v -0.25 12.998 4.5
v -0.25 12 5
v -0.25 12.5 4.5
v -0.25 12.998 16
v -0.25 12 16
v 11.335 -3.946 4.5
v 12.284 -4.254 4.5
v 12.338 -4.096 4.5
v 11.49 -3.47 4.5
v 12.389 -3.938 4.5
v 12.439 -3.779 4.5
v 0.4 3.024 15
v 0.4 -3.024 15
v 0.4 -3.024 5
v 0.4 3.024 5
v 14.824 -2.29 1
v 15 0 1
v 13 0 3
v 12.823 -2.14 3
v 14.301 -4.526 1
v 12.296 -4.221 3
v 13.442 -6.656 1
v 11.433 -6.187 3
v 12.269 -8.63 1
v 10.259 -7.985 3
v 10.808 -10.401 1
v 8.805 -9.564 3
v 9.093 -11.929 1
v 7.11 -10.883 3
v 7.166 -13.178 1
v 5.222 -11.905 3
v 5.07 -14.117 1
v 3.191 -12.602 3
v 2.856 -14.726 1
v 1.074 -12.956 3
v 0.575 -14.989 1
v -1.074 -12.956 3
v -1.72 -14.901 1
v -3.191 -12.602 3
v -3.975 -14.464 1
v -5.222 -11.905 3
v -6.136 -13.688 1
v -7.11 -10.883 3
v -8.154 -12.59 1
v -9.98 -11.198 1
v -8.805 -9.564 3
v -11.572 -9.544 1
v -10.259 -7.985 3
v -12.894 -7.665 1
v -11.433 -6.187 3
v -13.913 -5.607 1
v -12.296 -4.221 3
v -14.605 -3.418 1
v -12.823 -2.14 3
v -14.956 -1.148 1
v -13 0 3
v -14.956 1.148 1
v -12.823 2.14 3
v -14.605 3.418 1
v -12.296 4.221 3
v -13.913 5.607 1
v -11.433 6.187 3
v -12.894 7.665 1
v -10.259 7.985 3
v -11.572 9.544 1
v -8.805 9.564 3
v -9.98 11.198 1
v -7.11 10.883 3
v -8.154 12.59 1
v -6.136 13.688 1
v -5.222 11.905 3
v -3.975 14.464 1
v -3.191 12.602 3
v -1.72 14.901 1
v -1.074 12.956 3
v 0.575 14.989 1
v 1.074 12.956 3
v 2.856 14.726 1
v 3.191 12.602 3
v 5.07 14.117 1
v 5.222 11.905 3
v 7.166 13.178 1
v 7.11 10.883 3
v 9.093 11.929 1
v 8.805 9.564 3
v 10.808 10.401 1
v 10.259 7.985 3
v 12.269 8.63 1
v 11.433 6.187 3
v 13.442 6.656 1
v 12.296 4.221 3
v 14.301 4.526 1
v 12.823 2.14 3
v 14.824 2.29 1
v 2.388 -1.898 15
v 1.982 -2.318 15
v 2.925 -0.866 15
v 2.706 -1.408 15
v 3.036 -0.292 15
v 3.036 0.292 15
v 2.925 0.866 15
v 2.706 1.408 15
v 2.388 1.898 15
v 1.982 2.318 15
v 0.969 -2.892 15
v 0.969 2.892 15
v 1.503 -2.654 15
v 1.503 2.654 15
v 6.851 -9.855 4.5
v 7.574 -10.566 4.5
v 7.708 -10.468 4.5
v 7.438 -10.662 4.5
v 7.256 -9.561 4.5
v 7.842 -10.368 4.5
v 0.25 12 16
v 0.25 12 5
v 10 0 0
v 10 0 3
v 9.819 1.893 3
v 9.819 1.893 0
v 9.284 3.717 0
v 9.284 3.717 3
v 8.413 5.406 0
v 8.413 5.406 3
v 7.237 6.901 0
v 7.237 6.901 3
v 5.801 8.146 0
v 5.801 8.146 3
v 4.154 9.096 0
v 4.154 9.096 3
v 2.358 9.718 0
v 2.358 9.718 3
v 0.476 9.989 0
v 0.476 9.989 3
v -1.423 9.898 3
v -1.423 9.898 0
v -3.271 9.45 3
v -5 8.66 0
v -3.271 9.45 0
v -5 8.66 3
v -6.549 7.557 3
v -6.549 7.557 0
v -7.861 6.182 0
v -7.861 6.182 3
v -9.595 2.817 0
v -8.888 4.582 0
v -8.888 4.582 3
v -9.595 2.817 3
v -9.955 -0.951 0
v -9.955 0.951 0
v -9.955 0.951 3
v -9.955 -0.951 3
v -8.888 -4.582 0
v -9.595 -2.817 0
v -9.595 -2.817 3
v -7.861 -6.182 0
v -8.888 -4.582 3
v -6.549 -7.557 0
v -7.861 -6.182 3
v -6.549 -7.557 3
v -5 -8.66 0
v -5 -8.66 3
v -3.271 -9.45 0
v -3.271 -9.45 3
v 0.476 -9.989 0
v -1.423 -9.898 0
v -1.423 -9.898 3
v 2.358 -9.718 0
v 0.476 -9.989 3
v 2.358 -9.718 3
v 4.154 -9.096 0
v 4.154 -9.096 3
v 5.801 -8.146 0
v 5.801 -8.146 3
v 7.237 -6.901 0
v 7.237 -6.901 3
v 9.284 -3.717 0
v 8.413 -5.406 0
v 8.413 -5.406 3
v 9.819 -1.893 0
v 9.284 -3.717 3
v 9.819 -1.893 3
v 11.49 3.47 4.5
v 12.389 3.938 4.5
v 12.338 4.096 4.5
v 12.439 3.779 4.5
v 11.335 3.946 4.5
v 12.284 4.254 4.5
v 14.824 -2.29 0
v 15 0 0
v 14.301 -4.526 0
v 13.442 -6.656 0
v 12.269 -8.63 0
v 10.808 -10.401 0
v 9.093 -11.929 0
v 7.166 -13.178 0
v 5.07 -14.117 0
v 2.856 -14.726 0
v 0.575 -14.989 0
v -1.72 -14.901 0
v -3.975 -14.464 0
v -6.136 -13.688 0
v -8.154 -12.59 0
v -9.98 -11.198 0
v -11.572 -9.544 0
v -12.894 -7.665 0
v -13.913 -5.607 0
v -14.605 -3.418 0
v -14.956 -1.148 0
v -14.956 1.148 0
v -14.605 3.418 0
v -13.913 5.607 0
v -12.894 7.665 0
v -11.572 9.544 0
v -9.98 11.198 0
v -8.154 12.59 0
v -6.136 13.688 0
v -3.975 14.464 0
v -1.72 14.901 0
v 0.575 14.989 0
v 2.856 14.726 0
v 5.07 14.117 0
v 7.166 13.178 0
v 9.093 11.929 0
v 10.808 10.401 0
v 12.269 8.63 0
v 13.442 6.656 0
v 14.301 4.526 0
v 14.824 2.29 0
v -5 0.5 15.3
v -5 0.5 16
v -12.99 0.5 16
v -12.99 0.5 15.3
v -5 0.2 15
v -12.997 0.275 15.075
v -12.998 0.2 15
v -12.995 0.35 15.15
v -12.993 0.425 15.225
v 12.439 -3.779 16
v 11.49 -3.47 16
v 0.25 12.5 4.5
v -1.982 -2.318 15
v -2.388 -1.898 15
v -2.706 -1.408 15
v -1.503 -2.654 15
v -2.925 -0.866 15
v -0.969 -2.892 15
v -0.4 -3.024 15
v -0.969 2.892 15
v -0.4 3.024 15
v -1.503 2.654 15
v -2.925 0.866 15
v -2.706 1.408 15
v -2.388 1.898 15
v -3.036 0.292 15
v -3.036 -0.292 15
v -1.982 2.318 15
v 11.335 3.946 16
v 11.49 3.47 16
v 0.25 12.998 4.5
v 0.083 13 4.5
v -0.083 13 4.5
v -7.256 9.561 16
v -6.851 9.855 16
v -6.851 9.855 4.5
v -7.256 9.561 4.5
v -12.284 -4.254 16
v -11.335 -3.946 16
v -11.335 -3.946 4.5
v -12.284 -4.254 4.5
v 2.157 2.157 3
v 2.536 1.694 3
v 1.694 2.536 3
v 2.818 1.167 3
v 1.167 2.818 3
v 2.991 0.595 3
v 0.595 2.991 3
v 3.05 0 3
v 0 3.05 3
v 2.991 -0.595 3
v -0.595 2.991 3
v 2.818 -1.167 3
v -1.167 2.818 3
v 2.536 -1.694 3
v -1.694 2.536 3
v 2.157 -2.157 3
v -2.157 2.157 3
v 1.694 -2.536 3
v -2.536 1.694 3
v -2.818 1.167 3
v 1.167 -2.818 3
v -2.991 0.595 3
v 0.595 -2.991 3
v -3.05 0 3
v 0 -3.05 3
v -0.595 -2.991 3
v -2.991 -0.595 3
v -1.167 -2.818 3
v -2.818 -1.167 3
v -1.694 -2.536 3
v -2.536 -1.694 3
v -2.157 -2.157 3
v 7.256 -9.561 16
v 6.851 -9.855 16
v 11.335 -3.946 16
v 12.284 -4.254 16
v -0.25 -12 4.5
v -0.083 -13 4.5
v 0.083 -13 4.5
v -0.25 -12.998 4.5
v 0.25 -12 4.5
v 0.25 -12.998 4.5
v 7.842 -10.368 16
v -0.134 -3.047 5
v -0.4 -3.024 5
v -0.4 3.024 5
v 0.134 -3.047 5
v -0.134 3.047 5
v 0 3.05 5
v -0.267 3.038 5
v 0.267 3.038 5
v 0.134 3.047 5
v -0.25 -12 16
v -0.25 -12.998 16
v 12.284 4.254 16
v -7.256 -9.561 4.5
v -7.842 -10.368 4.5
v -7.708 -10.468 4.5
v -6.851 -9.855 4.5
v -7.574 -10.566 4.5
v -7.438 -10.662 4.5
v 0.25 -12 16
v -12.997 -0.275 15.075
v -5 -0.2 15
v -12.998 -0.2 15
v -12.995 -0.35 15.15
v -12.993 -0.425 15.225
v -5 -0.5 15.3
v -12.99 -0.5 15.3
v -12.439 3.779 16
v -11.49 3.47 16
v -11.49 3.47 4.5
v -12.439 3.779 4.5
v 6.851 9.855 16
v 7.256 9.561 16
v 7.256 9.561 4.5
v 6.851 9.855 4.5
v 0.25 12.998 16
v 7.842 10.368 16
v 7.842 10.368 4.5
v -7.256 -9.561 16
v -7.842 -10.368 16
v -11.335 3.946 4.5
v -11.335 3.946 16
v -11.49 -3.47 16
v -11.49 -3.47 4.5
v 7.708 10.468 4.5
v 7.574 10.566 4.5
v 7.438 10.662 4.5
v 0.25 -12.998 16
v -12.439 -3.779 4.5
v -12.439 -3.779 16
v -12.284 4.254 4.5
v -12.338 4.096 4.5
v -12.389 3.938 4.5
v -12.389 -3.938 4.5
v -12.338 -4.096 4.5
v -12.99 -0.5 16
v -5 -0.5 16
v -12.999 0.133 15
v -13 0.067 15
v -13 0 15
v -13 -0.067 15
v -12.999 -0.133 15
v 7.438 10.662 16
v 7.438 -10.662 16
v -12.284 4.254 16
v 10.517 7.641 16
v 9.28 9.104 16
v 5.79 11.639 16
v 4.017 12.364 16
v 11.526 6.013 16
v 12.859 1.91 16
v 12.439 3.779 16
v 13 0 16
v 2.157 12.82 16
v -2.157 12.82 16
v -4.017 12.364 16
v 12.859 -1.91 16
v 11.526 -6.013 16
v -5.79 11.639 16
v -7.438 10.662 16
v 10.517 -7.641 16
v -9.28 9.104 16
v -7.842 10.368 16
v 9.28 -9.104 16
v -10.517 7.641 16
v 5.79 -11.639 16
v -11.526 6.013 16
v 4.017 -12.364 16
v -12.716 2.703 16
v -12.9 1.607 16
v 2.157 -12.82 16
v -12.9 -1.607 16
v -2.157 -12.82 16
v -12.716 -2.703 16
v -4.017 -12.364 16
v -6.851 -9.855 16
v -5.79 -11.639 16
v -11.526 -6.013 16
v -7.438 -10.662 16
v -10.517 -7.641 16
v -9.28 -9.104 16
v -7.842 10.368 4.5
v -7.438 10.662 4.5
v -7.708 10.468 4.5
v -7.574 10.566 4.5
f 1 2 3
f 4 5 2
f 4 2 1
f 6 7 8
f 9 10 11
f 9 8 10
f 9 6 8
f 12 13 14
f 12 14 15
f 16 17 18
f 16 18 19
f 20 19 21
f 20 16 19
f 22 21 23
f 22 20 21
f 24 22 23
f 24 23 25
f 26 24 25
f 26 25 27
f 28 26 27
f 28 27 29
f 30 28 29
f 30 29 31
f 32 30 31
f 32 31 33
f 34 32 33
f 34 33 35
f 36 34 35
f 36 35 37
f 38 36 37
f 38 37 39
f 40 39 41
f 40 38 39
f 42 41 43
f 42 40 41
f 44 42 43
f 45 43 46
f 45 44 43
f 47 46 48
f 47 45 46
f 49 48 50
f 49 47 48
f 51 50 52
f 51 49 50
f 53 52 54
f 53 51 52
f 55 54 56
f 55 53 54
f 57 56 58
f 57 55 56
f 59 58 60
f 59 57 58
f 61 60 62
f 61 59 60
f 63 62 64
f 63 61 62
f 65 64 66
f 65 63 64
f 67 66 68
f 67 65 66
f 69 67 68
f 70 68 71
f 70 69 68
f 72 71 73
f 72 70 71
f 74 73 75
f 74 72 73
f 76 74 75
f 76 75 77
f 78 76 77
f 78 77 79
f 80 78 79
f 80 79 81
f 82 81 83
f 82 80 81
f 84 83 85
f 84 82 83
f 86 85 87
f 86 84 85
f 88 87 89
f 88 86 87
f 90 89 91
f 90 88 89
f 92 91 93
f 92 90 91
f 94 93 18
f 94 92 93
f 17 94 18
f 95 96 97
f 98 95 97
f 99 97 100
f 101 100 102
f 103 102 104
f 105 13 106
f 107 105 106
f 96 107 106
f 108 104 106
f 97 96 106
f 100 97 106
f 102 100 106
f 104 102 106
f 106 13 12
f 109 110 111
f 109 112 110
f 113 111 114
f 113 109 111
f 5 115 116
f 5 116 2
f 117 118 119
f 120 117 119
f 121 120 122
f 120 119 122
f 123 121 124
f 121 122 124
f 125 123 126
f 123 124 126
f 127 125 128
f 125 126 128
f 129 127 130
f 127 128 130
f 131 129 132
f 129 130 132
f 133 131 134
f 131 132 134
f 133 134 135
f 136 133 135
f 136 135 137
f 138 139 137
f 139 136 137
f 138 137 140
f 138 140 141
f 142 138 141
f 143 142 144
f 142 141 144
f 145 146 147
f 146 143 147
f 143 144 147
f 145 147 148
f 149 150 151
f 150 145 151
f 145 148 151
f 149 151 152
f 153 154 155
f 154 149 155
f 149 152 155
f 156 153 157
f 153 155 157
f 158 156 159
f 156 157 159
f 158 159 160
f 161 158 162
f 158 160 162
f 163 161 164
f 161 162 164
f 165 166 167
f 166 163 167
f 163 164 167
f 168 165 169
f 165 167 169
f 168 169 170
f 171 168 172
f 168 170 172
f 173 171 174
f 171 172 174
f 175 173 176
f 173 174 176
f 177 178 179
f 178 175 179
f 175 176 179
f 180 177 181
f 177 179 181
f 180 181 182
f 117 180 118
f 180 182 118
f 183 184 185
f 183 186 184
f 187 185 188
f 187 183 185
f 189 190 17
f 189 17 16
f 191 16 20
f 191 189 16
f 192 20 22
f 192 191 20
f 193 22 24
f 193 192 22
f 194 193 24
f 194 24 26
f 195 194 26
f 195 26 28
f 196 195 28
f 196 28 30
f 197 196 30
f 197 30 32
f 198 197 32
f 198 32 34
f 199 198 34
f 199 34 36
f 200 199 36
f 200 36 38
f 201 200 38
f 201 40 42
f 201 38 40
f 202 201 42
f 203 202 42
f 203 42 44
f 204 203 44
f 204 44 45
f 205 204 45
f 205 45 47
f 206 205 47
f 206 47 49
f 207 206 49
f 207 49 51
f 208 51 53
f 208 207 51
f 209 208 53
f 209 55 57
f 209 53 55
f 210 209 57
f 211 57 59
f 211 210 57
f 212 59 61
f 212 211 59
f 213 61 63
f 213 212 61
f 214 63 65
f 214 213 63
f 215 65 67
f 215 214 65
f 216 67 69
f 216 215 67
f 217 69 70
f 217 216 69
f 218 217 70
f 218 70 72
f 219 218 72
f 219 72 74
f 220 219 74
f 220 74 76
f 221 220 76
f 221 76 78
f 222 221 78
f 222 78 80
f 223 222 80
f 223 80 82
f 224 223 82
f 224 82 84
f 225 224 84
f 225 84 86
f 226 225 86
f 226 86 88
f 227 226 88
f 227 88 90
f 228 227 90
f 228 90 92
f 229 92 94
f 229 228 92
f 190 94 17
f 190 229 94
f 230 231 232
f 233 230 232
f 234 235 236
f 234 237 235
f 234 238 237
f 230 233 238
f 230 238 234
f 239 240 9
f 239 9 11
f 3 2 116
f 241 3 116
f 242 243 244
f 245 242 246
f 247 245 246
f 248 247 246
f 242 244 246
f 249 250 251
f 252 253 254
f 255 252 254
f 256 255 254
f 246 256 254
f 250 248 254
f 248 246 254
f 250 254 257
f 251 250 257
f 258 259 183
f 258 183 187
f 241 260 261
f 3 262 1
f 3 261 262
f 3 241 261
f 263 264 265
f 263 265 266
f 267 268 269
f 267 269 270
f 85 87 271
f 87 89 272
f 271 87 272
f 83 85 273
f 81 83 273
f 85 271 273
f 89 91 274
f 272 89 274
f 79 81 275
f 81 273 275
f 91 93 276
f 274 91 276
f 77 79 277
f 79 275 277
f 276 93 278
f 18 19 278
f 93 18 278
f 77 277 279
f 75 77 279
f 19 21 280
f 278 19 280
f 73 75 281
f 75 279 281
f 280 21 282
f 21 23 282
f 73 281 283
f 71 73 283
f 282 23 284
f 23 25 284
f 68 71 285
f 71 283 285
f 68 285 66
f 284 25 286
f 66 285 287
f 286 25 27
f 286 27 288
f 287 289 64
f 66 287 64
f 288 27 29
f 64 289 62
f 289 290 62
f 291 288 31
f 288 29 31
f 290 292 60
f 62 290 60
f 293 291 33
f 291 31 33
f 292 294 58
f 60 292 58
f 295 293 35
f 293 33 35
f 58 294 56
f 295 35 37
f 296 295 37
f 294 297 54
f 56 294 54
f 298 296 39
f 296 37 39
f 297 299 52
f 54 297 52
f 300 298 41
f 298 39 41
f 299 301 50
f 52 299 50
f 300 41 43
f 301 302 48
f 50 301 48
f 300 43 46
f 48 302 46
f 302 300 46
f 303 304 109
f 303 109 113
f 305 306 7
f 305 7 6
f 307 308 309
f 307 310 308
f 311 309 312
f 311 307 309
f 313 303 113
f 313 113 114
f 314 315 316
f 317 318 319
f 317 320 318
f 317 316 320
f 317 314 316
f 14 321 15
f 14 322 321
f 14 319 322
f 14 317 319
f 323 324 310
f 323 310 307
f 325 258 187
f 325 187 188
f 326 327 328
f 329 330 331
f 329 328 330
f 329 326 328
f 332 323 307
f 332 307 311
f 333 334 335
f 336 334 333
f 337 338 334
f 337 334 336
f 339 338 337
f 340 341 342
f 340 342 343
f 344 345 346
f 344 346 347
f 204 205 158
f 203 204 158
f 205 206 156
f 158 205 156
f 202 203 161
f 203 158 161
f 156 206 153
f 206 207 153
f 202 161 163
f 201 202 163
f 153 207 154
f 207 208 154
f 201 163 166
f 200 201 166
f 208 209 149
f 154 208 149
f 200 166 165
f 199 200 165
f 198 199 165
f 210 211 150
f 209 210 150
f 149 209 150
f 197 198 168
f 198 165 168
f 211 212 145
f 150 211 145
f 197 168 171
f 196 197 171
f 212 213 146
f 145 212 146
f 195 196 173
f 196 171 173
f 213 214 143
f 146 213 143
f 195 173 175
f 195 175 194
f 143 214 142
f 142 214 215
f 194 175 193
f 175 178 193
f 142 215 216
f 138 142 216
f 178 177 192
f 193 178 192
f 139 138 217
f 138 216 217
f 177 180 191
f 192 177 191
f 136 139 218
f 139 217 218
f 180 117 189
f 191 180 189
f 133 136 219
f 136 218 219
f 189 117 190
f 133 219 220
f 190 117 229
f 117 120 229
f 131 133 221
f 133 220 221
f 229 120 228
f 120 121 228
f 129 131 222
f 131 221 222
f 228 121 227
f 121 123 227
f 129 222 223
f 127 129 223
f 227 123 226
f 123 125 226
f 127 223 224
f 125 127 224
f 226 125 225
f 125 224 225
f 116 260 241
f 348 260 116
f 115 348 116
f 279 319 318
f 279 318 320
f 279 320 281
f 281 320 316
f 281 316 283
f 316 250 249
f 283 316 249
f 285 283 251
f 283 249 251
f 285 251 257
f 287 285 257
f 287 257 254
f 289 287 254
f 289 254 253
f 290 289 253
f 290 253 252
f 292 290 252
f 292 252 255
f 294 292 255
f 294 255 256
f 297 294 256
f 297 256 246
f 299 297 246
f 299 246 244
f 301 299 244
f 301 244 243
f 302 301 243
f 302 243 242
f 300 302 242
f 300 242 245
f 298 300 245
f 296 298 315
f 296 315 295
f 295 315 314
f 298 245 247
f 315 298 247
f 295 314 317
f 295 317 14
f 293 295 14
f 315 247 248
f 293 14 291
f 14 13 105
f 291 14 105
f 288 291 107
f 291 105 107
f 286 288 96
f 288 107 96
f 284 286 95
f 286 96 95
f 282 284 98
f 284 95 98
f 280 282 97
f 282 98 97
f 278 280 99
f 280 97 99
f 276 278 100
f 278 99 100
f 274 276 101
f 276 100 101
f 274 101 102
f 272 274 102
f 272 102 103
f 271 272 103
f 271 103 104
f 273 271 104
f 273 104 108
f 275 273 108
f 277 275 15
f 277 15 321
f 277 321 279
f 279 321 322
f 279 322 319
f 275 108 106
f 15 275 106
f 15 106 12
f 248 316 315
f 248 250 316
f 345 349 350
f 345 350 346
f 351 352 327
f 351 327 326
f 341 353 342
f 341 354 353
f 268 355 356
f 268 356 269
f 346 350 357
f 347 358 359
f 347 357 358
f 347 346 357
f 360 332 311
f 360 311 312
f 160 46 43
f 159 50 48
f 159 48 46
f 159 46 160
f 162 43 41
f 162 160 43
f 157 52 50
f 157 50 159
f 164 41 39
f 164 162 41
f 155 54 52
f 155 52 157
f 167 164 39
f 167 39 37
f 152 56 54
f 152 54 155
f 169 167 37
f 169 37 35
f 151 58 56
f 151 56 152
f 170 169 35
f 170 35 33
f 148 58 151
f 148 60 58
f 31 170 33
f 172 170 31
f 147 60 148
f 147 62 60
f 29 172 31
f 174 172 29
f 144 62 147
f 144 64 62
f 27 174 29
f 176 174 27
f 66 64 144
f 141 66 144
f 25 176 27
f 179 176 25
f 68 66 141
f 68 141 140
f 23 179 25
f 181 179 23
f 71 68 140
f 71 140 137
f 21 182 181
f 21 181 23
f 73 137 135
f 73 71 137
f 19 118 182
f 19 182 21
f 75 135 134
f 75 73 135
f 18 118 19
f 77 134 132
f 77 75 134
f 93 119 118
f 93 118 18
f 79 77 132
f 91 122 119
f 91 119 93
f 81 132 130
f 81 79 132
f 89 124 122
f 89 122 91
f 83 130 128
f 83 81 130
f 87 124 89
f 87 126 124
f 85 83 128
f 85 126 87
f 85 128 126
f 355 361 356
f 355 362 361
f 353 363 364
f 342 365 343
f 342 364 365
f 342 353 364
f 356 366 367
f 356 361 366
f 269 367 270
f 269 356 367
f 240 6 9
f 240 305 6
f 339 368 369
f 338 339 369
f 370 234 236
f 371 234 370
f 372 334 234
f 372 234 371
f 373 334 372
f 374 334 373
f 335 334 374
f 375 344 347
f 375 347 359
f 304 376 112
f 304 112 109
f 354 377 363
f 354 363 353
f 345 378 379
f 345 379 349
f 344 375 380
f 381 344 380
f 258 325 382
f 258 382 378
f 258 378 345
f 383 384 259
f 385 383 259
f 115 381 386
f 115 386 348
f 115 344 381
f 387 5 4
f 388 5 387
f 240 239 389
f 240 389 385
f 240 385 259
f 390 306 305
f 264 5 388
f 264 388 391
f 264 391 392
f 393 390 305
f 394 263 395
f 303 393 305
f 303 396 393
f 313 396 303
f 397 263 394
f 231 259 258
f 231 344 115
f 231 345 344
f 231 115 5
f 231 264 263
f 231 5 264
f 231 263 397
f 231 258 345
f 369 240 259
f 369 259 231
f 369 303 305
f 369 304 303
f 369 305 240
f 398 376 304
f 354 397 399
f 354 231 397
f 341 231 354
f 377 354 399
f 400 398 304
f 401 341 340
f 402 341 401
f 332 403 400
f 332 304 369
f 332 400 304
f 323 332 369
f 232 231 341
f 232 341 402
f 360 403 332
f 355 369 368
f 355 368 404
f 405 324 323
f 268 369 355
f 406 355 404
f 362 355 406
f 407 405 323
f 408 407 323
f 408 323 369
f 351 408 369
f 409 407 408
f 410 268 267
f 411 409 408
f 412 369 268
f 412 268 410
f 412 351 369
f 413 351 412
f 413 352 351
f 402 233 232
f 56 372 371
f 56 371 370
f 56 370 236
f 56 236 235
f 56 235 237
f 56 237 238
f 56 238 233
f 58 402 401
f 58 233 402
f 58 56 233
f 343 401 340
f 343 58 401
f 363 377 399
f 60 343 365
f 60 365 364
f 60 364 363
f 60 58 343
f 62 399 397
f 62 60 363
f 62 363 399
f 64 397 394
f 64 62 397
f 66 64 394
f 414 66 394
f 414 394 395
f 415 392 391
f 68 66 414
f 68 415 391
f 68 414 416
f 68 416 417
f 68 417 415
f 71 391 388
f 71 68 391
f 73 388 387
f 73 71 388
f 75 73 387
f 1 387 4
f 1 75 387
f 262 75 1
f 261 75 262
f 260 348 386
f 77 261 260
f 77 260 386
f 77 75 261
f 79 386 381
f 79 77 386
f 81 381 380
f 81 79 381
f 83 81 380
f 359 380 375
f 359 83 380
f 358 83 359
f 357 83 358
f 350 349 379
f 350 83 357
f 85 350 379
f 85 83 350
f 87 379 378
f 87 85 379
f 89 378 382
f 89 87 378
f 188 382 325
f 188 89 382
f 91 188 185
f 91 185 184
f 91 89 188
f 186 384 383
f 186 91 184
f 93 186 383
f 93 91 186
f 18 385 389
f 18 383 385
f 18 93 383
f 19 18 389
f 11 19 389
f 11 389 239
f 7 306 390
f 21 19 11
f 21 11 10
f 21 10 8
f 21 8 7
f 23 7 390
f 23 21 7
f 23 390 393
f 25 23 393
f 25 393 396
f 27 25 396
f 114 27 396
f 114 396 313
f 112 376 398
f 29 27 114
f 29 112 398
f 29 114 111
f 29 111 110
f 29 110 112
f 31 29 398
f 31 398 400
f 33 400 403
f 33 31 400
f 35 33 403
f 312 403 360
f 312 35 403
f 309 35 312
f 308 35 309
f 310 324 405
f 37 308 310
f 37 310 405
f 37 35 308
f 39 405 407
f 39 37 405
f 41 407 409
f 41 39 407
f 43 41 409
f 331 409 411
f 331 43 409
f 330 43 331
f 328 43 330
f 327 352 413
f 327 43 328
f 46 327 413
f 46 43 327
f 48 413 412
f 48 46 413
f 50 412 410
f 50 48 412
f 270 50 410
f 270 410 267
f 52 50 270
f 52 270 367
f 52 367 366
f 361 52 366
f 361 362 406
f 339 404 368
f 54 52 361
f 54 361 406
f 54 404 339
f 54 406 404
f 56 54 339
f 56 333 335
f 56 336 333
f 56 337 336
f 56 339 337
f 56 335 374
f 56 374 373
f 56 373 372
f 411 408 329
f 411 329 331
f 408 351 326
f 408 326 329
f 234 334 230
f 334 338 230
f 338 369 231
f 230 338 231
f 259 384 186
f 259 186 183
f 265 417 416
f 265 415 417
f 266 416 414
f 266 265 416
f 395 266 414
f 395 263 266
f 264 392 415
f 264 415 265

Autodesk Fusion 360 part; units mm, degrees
sketch "Sketch1" plane through (0, 0, 0) normal (0, 0, 1) x (1, 0, 0) in component "Knob"
  circle A0 centre (0, 0) radius 15
  dimension "d1" = 30
extrude "Extrude1" add sketch "Sketch1" along normal blind 3 makes body 1 in component "Knob"
sketch "Sketch2" plane through (0, 0, 3) normal (0, 0, 1) x (-1, 0, 0) in component "Knob"
  circle A0 centre (0, 0) radius 15
  circle A1 centre (0, 0) radius 13
  dimension "d7" = 26
extrude "Extrude2" add sketch "Sketch2" along normal blind 13 separate body contours A1 makes body 2 in component "Knob"
hole "Hole2" at (0, 0, 3) direction (0, 0, 1) diameter 6.1 depth 12 tip angle 180 bodies 2 in component "Knob"
sketch "Sketch5" plane through (0, 0, 0) normal (0, 1, 0) x (1, 0, 0) in component "Knob"
  line L0 (0, -3) -> (0, 0)
  line L1 (0, 0) -> (10, 0)
  line L2 (10, 0) -> (10, -3)
  line L3 (10, -3) -> (0, -3)
  dimension "d26" = 10
  dimension "d27" = 3
revolve "Revolve1" cut sketch "Sketch5" angle 360 about axis through (0, 0, 3) along (0, 0, -1) bodies 1 in component "Knob"
sketch "Sketch6" plane through (0, 0, 16) normal (0, 0, 1) x (-1, 0, 0) in component "Knob"
  line L0 (5, -0.5) -> (15, -0.5)
  line L1 (15, -0.5) -> (15, 0.5)
  line L2 (15, 0.5) -> (5, 0.5)
  line L3 (5, 0.5) -> (5, -0.5)
  circle A0 centre (0, 0) radius 13
  dimension "d29" = 5
  dimension "d30" = 10
  dimension "d31" = 1
  dimension "d32" = 0.5
extrude "Extrude3" cut sketch "Sketch6" against normal blind 1 contours L0 L2 L3 A0 | L0 L1 L2 A0 picked at (7.6667, 0) bodies 2 in component "Knob"
chamfer "Chamfer2" distance 0.3 angle 45 2 edges at (-8.9952, 0.5, 15) (-8.9952, -0.5, 15) on bodies 2 in component "Knob"
sketch "Sketch1 (2)" plane through (0, 0, 16) normal (0, 0, 1) x (-1, 0, 0)
  line L0 (5, -0.5) -> (5, 0.5)
  line L1 (0.25, -13.5) -> (-0.25, -13.5)
  line L2 (-0.25, -13.5) -> (-0.25, -12)
  line L3 (-0.25, -12) -> (0.25, -12)
  line L4 (0.25, -12) -> (0.25, -13.5)
  arc A0 (12.9904, 0.5) -> (12.9904, -0.5) centre (0, 0) ccw
  line L5 (12.9904, -0.5) -> (5, -0.5)
  line L6 (5, 0.5) -> (12.9904, 0.5)
  dimension "d36" = 0.5
  dimension "d37" = 1.5
  dimension "d38" = 0.25
  dimension "d39" = 13.5
extrude "Extrude4" cut sketch "Sketch1 (2)" against normal blind 11.5 contours L2 L3 L4 A0 | L1 L2 L4 A0 bodies 2 in component "Knob"
chamfer "Chamfer4" distance 2 angle 45 1 edges at (-13.9849, -5.4242, 3) on bodies 1 in component "Knob"
chamfer "Chamfer6" distance 0.5 angle 45 1 edges at (0, 12, 4.5) on bodies 2 in component "Knob"
pattern_circular "C-Pattern3" count 10 over 360 about axis through (0, 0, 16) along (0, 0, 1) of "Extrude4" in component "Knob"
sketch "Sketch2 (2)" plane through (0, 0, 15) normal (0, 0, -1) x (1, 0, 0)
  circle A0 centre (0, 0) radius 3.05
  line L0 (-0.4, 3.1) -> (0.4, 3.1)
  line L1 (0.4, 3.1) -> (0.4, -3.1)
  line L2 (0.4, -3.1) -> (-0.4, -3.1)
  line L3 (-0.4, -3.1) -> (-0.4, 3.1)
  line L4 (0, 3.1) -> (0, -3.1) construction
  dimension "d50" = 6.2
  dimension "d51" = 0.8
extrude "Extrude5" add sketch "Sketch2 (2)" along normal blind 10 contours A0 L1 L3 | A0 L0 L1 L3 | A0 L1 L2 L3 bodies 2 in component "Knob"
component "Knob" placed x (1, 0, 0) y (0, 1, 0) z (0, 0, 1) at (0, 0, 0)
